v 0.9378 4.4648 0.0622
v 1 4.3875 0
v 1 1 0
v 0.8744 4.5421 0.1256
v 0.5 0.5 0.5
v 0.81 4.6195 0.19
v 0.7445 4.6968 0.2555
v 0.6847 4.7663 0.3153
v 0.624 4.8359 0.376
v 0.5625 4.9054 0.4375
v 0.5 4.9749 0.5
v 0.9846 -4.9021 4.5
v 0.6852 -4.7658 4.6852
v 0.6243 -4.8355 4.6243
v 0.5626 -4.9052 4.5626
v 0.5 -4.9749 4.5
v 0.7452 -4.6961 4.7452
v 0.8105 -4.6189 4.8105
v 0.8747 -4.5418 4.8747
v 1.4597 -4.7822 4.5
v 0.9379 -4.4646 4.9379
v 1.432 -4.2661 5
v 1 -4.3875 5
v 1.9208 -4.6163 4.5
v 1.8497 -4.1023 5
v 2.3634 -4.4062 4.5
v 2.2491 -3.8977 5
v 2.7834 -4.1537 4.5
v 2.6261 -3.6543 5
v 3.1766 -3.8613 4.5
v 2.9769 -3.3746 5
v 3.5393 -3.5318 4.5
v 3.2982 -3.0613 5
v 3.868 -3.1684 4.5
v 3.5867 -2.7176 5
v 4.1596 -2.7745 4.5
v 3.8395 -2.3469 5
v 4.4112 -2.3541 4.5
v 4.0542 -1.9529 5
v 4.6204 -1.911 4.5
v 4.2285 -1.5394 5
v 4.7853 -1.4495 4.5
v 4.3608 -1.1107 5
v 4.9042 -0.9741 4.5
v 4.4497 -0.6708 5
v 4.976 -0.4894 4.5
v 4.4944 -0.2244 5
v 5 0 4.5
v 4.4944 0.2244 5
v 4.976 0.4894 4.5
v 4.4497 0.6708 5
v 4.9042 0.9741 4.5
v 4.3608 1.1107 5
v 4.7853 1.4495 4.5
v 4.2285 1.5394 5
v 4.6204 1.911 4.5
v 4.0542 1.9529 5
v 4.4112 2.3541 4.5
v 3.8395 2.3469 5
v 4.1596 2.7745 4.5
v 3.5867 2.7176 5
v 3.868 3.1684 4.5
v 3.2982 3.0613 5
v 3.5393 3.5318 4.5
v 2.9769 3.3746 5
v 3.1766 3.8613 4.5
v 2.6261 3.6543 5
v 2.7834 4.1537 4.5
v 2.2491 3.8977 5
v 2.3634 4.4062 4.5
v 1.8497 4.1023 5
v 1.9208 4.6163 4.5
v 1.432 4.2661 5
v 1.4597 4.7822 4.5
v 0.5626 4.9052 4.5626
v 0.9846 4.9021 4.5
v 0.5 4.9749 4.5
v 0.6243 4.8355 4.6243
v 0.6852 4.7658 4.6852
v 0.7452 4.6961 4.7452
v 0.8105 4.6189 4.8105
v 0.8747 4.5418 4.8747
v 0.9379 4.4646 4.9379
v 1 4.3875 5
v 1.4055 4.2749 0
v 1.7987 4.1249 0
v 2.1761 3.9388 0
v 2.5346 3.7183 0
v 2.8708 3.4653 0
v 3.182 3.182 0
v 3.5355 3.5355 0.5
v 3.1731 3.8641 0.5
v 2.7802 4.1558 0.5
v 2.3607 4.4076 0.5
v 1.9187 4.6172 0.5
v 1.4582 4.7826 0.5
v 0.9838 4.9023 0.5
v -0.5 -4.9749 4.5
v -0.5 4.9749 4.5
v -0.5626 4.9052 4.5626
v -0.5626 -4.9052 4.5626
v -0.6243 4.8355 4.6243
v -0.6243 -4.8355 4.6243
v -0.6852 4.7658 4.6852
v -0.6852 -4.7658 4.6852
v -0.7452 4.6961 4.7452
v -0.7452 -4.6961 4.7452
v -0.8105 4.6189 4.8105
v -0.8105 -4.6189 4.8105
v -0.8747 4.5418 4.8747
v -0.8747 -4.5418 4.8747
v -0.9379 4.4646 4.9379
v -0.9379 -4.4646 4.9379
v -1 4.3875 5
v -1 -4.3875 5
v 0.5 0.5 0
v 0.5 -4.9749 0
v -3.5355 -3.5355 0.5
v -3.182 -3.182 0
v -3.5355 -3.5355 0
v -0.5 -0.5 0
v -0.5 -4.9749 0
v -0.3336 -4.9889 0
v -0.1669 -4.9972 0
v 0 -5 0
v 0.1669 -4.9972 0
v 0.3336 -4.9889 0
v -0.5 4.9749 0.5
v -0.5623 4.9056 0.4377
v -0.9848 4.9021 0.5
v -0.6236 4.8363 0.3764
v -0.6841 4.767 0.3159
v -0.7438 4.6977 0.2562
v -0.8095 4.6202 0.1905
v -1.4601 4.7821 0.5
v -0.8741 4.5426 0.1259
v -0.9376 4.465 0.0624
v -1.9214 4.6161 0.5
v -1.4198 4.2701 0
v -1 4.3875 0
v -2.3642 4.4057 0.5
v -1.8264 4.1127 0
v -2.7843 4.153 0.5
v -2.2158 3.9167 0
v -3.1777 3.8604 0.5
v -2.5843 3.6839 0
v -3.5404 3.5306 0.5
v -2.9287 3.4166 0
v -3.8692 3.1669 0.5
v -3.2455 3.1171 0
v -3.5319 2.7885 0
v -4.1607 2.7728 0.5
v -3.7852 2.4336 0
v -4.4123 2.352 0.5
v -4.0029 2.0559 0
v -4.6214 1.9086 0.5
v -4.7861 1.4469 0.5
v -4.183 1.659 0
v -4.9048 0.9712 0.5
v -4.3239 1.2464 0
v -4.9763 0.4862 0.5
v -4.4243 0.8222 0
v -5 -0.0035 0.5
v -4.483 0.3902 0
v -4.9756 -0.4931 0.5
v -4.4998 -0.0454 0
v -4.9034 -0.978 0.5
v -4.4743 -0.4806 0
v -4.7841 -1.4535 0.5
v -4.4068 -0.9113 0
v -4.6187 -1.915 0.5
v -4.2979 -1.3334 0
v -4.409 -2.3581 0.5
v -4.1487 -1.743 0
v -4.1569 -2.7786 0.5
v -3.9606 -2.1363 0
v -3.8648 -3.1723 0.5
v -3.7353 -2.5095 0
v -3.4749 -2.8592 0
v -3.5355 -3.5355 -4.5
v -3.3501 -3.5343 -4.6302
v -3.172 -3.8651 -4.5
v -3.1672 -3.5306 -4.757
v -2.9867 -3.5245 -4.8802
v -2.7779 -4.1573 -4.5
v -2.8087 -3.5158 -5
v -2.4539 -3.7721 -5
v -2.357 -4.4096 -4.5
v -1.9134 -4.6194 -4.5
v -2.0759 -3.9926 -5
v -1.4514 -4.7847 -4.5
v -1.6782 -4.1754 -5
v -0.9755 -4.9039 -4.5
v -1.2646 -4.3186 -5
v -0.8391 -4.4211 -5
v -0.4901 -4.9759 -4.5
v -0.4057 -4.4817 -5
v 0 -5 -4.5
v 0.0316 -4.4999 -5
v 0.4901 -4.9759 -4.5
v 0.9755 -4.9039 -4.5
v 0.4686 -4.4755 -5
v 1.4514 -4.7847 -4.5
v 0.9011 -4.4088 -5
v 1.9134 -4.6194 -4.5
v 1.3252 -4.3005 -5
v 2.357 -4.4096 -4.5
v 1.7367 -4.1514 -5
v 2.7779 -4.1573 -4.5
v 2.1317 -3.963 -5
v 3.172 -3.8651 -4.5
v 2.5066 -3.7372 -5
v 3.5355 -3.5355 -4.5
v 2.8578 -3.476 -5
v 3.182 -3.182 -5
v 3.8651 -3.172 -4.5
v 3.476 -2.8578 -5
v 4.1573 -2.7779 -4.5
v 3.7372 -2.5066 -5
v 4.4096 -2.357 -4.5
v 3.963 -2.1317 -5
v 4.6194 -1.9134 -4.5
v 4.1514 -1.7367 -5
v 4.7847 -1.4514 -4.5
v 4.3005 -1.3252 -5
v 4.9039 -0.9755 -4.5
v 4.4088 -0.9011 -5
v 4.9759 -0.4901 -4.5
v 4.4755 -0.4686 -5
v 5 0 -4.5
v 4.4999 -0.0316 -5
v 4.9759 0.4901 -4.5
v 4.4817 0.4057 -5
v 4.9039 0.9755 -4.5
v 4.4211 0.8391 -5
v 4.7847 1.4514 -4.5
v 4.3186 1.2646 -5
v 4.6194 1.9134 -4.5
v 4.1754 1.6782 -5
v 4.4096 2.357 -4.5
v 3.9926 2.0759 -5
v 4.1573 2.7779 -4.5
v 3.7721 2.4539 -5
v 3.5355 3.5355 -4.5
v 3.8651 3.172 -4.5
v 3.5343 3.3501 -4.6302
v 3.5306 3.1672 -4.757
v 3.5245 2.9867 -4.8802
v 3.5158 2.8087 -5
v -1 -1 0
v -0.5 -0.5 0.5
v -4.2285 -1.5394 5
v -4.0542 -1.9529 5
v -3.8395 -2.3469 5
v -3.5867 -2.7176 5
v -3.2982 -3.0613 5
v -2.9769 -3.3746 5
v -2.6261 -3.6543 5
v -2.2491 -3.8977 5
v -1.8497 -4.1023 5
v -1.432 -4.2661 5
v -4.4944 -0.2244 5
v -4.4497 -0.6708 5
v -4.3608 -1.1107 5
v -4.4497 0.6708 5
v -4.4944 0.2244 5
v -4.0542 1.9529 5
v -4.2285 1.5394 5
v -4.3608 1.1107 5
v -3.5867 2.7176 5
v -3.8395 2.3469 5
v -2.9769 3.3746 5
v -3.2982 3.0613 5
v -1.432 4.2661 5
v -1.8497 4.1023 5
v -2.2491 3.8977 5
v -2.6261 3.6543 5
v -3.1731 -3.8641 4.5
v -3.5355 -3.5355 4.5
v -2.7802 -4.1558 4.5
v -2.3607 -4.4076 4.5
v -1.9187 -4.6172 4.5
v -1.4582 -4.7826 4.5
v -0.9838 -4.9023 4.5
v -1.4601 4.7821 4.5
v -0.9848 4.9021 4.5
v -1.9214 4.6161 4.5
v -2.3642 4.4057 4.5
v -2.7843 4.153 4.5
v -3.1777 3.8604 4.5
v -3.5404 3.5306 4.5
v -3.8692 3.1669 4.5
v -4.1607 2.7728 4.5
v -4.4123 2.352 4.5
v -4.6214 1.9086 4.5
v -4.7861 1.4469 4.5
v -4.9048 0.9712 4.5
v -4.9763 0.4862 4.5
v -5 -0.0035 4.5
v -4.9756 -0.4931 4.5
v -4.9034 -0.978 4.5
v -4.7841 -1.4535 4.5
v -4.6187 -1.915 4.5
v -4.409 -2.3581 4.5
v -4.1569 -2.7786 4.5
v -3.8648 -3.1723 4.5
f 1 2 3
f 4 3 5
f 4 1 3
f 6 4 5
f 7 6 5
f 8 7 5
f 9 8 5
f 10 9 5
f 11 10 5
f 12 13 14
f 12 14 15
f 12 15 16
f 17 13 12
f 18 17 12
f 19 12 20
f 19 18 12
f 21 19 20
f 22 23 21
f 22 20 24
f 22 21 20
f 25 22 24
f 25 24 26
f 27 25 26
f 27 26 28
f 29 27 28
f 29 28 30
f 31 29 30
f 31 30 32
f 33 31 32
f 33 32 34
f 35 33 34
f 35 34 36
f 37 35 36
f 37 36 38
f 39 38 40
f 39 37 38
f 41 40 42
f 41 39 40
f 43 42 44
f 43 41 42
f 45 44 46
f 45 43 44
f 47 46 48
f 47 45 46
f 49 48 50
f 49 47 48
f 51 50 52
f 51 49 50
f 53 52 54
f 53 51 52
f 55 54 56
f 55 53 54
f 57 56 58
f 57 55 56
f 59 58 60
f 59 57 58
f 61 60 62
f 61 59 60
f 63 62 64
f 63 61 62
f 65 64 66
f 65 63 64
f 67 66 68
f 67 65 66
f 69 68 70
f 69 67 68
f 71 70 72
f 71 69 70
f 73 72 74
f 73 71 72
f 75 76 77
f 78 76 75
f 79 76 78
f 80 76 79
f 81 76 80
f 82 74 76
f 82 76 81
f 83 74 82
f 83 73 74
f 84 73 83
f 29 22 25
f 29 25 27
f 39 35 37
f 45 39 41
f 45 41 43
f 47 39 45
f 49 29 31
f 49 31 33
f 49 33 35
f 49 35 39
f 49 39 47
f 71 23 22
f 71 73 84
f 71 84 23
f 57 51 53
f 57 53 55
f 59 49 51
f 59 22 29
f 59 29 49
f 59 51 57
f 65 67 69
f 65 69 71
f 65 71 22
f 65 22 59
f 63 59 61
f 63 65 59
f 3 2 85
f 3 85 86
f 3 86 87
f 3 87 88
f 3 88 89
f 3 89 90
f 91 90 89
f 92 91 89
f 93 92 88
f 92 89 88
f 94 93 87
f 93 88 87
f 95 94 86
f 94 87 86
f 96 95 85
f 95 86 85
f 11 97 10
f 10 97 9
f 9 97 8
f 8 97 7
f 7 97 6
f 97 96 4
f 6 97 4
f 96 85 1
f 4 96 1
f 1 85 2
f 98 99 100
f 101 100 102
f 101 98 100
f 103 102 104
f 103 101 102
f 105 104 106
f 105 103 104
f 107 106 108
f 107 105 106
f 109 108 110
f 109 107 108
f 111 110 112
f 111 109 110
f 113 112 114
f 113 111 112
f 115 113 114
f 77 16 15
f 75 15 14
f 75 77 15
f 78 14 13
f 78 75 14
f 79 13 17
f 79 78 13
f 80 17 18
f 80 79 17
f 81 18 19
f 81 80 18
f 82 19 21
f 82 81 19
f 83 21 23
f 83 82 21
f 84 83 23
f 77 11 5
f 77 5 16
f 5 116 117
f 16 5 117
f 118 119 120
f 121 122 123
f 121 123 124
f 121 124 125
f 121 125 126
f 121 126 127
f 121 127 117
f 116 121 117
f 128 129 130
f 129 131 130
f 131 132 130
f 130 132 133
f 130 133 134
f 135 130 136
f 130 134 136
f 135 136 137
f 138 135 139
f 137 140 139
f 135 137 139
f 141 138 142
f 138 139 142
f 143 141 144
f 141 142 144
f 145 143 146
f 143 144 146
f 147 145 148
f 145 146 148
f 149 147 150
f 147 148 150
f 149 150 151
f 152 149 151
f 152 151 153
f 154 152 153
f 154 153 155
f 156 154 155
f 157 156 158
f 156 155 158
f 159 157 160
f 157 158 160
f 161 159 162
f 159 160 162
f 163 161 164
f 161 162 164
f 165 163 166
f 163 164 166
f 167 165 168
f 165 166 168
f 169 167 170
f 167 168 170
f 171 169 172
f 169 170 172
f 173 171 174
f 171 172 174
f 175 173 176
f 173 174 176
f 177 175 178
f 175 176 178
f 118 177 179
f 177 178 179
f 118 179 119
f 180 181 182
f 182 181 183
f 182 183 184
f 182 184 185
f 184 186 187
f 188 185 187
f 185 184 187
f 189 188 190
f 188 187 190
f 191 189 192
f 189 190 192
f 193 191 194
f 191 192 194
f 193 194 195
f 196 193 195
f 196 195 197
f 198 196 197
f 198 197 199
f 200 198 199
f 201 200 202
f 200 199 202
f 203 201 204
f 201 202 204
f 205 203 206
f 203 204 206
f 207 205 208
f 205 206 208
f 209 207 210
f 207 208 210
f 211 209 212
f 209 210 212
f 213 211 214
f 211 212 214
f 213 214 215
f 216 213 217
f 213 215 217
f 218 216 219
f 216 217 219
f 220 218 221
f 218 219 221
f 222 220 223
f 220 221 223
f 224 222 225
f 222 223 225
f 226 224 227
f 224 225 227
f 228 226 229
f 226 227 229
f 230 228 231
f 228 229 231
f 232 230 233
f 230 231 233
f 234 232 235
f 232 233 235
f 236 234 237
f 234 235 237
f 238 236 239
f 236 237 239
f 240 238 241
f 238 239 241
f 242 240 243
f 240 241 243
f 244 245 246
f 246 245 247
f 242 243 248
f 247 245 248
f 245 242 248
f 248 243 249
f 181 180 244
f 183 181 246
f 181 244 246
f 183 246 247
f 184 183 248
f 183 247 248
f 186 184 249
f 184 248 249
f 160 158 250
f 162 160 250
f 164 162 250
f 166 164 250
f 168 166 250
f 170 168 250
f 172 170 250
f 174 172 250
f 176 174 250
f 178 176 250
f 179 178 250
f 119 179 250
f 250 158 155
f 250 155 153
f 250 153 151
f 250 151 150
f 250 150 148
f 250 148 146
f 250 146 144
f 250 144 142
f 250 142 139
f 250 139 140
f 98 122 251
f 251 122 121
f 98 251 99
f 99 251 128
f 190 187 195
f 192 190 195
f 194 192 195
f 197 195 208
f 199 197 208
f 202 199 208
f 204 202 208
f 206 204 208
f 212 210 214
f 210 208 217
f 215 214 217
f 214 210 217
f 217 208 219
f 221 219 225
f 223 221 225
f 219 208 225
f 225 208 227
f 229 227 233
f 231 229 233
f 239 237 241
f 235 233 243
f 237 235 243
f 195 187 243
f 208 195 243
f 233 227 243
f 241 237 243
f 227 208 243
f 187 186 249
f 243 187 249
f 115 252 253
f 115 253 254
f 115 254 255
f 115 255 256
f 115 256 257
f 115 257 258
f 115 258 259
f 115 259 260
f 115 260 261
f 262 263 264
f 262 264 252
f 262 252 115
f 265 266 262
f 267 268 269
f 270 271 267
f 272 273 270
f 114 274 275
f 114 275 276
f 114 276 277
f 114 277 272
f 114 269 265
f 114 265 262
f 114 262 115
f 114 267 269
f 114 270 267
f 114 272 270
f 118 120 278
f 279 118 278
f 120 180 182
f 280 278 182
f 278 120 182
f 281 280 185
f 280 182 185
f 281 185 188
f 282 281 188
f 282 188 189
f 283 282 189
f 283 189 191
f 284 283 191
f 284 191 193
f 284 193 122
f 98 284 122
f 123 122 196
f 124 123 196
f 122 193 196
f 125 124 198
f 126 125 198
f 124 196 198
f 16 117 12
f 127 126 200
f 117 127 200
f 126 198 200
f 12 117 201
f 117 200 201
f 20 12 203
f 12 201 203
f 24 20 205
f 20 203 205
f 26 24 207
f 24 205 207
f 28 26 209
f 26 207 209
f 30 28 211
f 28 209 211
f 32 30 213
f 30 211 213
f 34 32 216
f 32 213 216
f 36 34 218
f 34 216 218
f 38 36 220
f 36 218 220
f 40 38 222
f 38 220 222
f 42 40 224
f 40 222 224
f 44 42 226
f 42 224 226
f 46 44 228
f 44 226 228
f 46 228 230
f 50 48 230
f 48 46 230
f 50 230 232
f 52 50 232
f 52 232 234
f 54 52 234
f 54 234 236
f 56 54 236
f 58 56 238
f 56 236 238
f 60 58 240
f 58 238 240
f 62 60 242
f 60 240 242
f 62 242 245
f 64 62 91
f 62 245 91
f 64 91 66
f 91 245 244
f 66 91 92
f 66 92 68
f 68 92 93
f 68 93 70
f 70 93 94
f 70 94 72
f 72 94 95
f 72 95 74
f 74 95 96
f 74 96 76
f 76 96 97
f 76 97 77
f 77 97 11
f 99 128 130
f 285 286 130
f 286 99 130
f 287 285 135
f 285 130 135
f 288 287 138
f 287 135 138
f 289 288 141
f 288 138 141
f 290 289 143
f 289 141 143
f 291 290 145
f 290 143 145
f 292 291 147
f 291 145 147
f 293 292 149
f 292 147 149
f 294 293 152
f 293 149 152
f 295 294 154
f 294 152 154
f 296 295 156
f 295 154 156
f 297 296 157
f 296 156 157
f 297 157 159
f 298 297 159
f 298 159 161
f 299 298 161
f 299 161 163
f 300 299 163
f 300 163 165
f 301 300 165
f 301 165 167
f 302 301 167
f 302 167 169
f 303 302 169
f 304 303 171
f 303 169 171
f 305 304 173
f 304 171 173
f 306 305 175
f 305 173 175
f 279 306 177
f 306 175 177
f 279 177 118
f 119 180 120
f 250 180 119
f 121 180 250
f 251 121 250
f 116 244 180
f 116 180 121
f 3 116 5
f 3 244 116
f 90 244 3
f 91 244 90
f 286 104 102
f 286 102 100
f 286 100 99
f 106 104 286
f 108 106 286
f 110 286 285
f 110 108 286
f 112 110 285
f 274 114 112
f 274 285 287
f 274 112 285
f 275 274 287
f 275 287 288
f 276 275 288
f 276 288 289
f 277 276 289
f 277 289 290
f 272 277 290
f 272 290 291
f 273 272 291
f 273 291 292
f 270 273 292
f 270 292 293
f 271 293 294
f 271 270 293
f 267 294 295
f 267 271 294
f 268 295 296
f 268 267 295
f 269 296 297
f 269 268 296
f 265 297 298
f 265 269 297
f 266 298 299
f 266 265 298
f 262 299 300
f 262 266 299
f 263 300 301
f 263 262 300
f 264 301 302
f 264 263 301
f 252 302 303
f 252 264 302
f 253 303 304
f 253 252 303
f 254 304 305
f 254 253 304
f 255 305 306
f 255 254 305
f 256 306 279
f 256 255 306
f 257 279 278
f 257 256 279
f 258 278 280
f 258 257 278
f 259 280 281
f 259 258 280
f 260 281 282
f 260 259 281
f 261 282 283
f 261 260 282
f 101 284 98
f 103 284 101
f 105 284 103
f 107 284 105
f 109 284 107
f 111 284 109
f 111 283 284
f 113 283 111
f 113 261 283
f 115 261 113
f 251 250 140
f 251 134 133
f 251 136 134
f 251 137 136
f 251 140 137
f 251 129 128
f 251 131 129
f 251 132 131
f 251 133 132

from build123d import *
from build123d import SkipClean  # not in build123d's __all__

# Parameters (mm, degrees)
F1_DEPTH     = 5
F2_DEPTH     = 5
F3_T3_DEPTH  = 12.521557359
F3_T6_ANGLE  = 198.0325102457
F3_T9_ANGLE  = 198.0325102457
F3_T12_DEPTH = 12.521557359
F3_T15_ANGLE = 209.516708524
F3_T18_DEPTH = 12.571682988
F3_T21_ANGLE = 144.0077008654
F3_T24_ANGLE = 53.9966137912
F3_T27_DEPTH = 7.0466201735
F3_T31_DEPTH = 8.0466201735


# Not quite as in the source:
# - a fillet or chamfer that OpenCascade refuses, or shapes differently, is made with other operations: its cross-section is extruded or revolved along the edge and cut away or added


with BuildPart() as f1:
    # F0 (on Top) → F1 (new body)
    with BuildSketch(Plane.XY):
        with BuildLine():
            ThreePointArc((-3.5355339059, -3.5355339059), (-2.1422777427, -4.5178143026), (-0.5, -4.9749371855))
            Line((-0.5, -4.9749371855), (-0.5, -0.5))
            Line((-0.5, -0.5), (-3.5355339059, -3.5355339059))
        make_face()
        with BuildLine():
            ThreePointArc((-0.5, -4.9749371855), (-0.2503138753, -4.9937303656), (0, -5))
            Line((0, -5), (0, 0))
            Line((0, 0), (-0.5, -0.5))
            Line((-0.5, -0.5), (-0.5, -4.9749371855))
        make_face()
        with BuildLine():
            ThreePointArc((0, -5), (0.2503138753, -4.9937303656), (0.5, -4.9749371855))
            Line((0.5, -4.9749371855), (0.5, 0.5))
            Line((0.5, 0.5), (0, 0))
            Line((0, 0), (0, -5))
        make_face()
        with BuildLine():
            ThreePointArc((0.5, -4.9749371855), (3.7080992435, -3.3541019662), (5, 0))
            ThreePointArc((5, 0), (4.6193976626, 1.9134171618), (3.5355339059, 3.5355339059))
            Line((3.5355339059, 3.5355339059), (0.5, 0.5))
            Line((0.5, 0.5), (0.5, -4.9749371855))
        make_face()
    extrude(amount=-F1_DEPTH)

    # F0 (on Top) → F2 (join)
    with BuildSketch(Plane.XY):
        with BuildLine():
            Line((-0.5, -0.5), (-0.5, 4.9749371855))
            ThreePointArc((-0.5, 4.9749371855), (-4.7093962486, 1.6797580105), (-3.5355339059, -3.5355339059))
            Line((-3.5355339059, -3.5355339059), (-0.5, -0.5))
        make_face()
        with BuildLine():
            Line((0.5, 0.5), (3.5355339059, 3.5355339059))
            ThreePointArc((3.5355339059, 3.5355339059), (2.1422777427, 4.5178143026), (0.5, 4.9749371855))
            Line((0.5, 4.9749371855), (0.5, 0.5))
        make_face()
        with BuildLine():
            ThreePointArc((0.5, -4.9749371855), (3.7080992435, -3.3541019662), (5, 0))
            ThreePointArc((5, 0), (4.6193976626, 1.9134171618), (3.5355339059, 3.5355339059))
            Line((3.5355339059, 3.5355339059), (0.5, 0.5))
            Line((0.5, 0.5), (0.5, -4.9749371855))
        make_face()
        with BuildLine():
            ThreePointArc((-3.5355339059, -3.5355339059), (-2.1422777427, -4.5178143026), (-0.5, -4.9749371855))
            Line((-0.5, -4.9749371855), (-0.5, -0.5))
            Line((-0.5, -0.5), (-3.5355339059, -3.5355339059))
        make_face()
    with SkipClean():  # cleaning this boolean's faces spoils the solid; the shape is the same uncleaned
        extrude(amount=F2_DEPTH)

    # F3: chamfer of 0.5 on 12 edges, made by hand


with BuildPart() as f3_tool1:
    # F3_s2 → F3_t3 (new body)
    with BuildSketch(Plane.XZ.offset(-6.2607786795)):
        Polygon((0.5, 4.5), (1, 5), (0.5, 5), align=None)
    extrude(amount=F3_T3_DEPTH)


with BuildPart() as f3_tool4:
    # F3_s5 → F3_t6 (revolve)
    with BuildSketch(Plane(origin=(0, 0, 0), x_dir=(0, 0, 1), z_dir=(-0.9876439195, 0.1567146713, 0))):
        Polygon((4.5, -5), (5, -4.5), (5, -5), align=None)
    revolve(axis=Axis((0, 0, 5), (0, 0, 1)), revolution_arc=F3_T6_ANGLE)


with BuildPart() as f3_tool7:
    # F3_s8 → F3_t9 (revolve)
    with BuildSketch(Plane(origin=(0, 0, 0), x_dir=(0, 0, 1), z_dir=(0.9876439195, -0.1567146713, 0))):
        Polygon((4.5, -5), (5, -4.5), (5, -5), align=None)
    revolve(axis=Axis((0, 0, 5), (0, 0, 1)), revolution_arc=F3_T9_ANGLE)


with BuildPart() as f3_tool10:
    # F3_s11 → F3_t12 (new body)
    with BuildSketch(Plane.XZ.offset(6.2607786795)):
        Polygon((-0.5, 4.5), (-1, 5), (-0.5, 5), align=None)
    extrude(amount=-F3_T12_DEPTH)


with BuildPart() as f3_tool13:
    # F3_s14 → F3_t15 (revolve)
    with BuildSketch(Plane(origin=(0, 0, 0), x_dir=(0, 0, 1), z_dir=(-0.5036480164, 0.863908951, 0))):
        Polygon((-4.5, -5), (-5, -4.5), (-5, -5), align=None)
    revolve(axis=Axis((0, 0, -5), (0, 0, 1)), revolution_arc=F3_T15_ANGLE)


with BuildPart() as f3_tool16:
    # F3_s17 → F3_t18 (new body)
    with BuildSketch(Plane(origin=(4.4447611459, 4.4447611459, 0), x_dir=(0, 0, 1), z_dir=(-0.7071067812, -0.7071067812, 0))):
        Polygon((-4.5, 0), (-5, -0.5), (-5, 0), align=None)
    extrude(amount=F3_T18_DEPTH)


with BuildPart() as f3_tool19:
    # F3_s20 → F3_t21 (revolve)
    with BuildSketch(Plane(origin=(0, 0, 0), x_dir=(0, 0, 1), z_dir=(0.987667306, -0.1565672143, 0))):
        Polygon((0.5, -5), (0, -4.5), (0, -5), align=None)
    revolve(axis=Axis((0, 0, 0), (0, 0, 1)), revolution_arc=F3_T21_ANGLE)


with BuildPart() as f3_tool22:
    # F3_s23 → F3_t24 (revolve)
    with BuildSketch(Plane(origin=(0, 0, 0), x_dir=(0, 0, 1), z_dir=(0.7071067812, -0.7071067812, 0))):
        Polygon((0.5, -5), (0, -4.5), (0, -5), align=None)
    revolve(axis=Axis((0, 0, 0), (0, 0, 1)), revolution_arc=F3_T24_ANGLE)


with BuildPart() as f3_tool25:
    # F3_s26 → F3_t27 (new body)
    with BuildSketch(Plane.XZ.offset(-6.2607786795)):
        Polygon((1, 0), (0.5, 0.5), (0.5, 0), align=None)
    extrude(amount=F3_T27_DEPTH)

    split(bisect_by=Plane(origin=(0, 0, 0), x_dir=(0, 0, 1), z_dir=(-0.7071067812, 0.7071067812, 0)), keep=Keep.TOP)


with BuildPart() as f3_tool29:
    # F3_s30 → F3_t31 (new body)
    with BuildSketch(Plane.XZ.offset(1.785841494)):
        Polygon((-1, 0), (-0.5, 0.5), (-0.5, 0), align=None)
    extrude(amount=-F3_T31_DEPTH)

    split(bisect_by=Plane(origin=(0, 0, 0), x_dir=(0, 0, 1), z_dir=(-0.7071067812, 0.7071067812, 0)), keep=Keep.TOP)


with BuildPart() as f1_1:
    add(f1.part, clean=False)

    # F3_t33: cut F3_tool1, F3_tool4, F3_tool7, F3_tool10, F3_tool13, F3_tool16, F3_tool19, F3_tool22, F3_tool25, F3_tool29
    add([f3_tool1.part, f3_tool4.part, f3_tool7.part, f3_tool10.part, f3_tool13.part, f3_tool16.part, f3_tool19.part, f3_tool22.part, f3_tool25.part, f3_tool29.part], mode=Mode.SUBTRACT)


solid = f1_1.part
